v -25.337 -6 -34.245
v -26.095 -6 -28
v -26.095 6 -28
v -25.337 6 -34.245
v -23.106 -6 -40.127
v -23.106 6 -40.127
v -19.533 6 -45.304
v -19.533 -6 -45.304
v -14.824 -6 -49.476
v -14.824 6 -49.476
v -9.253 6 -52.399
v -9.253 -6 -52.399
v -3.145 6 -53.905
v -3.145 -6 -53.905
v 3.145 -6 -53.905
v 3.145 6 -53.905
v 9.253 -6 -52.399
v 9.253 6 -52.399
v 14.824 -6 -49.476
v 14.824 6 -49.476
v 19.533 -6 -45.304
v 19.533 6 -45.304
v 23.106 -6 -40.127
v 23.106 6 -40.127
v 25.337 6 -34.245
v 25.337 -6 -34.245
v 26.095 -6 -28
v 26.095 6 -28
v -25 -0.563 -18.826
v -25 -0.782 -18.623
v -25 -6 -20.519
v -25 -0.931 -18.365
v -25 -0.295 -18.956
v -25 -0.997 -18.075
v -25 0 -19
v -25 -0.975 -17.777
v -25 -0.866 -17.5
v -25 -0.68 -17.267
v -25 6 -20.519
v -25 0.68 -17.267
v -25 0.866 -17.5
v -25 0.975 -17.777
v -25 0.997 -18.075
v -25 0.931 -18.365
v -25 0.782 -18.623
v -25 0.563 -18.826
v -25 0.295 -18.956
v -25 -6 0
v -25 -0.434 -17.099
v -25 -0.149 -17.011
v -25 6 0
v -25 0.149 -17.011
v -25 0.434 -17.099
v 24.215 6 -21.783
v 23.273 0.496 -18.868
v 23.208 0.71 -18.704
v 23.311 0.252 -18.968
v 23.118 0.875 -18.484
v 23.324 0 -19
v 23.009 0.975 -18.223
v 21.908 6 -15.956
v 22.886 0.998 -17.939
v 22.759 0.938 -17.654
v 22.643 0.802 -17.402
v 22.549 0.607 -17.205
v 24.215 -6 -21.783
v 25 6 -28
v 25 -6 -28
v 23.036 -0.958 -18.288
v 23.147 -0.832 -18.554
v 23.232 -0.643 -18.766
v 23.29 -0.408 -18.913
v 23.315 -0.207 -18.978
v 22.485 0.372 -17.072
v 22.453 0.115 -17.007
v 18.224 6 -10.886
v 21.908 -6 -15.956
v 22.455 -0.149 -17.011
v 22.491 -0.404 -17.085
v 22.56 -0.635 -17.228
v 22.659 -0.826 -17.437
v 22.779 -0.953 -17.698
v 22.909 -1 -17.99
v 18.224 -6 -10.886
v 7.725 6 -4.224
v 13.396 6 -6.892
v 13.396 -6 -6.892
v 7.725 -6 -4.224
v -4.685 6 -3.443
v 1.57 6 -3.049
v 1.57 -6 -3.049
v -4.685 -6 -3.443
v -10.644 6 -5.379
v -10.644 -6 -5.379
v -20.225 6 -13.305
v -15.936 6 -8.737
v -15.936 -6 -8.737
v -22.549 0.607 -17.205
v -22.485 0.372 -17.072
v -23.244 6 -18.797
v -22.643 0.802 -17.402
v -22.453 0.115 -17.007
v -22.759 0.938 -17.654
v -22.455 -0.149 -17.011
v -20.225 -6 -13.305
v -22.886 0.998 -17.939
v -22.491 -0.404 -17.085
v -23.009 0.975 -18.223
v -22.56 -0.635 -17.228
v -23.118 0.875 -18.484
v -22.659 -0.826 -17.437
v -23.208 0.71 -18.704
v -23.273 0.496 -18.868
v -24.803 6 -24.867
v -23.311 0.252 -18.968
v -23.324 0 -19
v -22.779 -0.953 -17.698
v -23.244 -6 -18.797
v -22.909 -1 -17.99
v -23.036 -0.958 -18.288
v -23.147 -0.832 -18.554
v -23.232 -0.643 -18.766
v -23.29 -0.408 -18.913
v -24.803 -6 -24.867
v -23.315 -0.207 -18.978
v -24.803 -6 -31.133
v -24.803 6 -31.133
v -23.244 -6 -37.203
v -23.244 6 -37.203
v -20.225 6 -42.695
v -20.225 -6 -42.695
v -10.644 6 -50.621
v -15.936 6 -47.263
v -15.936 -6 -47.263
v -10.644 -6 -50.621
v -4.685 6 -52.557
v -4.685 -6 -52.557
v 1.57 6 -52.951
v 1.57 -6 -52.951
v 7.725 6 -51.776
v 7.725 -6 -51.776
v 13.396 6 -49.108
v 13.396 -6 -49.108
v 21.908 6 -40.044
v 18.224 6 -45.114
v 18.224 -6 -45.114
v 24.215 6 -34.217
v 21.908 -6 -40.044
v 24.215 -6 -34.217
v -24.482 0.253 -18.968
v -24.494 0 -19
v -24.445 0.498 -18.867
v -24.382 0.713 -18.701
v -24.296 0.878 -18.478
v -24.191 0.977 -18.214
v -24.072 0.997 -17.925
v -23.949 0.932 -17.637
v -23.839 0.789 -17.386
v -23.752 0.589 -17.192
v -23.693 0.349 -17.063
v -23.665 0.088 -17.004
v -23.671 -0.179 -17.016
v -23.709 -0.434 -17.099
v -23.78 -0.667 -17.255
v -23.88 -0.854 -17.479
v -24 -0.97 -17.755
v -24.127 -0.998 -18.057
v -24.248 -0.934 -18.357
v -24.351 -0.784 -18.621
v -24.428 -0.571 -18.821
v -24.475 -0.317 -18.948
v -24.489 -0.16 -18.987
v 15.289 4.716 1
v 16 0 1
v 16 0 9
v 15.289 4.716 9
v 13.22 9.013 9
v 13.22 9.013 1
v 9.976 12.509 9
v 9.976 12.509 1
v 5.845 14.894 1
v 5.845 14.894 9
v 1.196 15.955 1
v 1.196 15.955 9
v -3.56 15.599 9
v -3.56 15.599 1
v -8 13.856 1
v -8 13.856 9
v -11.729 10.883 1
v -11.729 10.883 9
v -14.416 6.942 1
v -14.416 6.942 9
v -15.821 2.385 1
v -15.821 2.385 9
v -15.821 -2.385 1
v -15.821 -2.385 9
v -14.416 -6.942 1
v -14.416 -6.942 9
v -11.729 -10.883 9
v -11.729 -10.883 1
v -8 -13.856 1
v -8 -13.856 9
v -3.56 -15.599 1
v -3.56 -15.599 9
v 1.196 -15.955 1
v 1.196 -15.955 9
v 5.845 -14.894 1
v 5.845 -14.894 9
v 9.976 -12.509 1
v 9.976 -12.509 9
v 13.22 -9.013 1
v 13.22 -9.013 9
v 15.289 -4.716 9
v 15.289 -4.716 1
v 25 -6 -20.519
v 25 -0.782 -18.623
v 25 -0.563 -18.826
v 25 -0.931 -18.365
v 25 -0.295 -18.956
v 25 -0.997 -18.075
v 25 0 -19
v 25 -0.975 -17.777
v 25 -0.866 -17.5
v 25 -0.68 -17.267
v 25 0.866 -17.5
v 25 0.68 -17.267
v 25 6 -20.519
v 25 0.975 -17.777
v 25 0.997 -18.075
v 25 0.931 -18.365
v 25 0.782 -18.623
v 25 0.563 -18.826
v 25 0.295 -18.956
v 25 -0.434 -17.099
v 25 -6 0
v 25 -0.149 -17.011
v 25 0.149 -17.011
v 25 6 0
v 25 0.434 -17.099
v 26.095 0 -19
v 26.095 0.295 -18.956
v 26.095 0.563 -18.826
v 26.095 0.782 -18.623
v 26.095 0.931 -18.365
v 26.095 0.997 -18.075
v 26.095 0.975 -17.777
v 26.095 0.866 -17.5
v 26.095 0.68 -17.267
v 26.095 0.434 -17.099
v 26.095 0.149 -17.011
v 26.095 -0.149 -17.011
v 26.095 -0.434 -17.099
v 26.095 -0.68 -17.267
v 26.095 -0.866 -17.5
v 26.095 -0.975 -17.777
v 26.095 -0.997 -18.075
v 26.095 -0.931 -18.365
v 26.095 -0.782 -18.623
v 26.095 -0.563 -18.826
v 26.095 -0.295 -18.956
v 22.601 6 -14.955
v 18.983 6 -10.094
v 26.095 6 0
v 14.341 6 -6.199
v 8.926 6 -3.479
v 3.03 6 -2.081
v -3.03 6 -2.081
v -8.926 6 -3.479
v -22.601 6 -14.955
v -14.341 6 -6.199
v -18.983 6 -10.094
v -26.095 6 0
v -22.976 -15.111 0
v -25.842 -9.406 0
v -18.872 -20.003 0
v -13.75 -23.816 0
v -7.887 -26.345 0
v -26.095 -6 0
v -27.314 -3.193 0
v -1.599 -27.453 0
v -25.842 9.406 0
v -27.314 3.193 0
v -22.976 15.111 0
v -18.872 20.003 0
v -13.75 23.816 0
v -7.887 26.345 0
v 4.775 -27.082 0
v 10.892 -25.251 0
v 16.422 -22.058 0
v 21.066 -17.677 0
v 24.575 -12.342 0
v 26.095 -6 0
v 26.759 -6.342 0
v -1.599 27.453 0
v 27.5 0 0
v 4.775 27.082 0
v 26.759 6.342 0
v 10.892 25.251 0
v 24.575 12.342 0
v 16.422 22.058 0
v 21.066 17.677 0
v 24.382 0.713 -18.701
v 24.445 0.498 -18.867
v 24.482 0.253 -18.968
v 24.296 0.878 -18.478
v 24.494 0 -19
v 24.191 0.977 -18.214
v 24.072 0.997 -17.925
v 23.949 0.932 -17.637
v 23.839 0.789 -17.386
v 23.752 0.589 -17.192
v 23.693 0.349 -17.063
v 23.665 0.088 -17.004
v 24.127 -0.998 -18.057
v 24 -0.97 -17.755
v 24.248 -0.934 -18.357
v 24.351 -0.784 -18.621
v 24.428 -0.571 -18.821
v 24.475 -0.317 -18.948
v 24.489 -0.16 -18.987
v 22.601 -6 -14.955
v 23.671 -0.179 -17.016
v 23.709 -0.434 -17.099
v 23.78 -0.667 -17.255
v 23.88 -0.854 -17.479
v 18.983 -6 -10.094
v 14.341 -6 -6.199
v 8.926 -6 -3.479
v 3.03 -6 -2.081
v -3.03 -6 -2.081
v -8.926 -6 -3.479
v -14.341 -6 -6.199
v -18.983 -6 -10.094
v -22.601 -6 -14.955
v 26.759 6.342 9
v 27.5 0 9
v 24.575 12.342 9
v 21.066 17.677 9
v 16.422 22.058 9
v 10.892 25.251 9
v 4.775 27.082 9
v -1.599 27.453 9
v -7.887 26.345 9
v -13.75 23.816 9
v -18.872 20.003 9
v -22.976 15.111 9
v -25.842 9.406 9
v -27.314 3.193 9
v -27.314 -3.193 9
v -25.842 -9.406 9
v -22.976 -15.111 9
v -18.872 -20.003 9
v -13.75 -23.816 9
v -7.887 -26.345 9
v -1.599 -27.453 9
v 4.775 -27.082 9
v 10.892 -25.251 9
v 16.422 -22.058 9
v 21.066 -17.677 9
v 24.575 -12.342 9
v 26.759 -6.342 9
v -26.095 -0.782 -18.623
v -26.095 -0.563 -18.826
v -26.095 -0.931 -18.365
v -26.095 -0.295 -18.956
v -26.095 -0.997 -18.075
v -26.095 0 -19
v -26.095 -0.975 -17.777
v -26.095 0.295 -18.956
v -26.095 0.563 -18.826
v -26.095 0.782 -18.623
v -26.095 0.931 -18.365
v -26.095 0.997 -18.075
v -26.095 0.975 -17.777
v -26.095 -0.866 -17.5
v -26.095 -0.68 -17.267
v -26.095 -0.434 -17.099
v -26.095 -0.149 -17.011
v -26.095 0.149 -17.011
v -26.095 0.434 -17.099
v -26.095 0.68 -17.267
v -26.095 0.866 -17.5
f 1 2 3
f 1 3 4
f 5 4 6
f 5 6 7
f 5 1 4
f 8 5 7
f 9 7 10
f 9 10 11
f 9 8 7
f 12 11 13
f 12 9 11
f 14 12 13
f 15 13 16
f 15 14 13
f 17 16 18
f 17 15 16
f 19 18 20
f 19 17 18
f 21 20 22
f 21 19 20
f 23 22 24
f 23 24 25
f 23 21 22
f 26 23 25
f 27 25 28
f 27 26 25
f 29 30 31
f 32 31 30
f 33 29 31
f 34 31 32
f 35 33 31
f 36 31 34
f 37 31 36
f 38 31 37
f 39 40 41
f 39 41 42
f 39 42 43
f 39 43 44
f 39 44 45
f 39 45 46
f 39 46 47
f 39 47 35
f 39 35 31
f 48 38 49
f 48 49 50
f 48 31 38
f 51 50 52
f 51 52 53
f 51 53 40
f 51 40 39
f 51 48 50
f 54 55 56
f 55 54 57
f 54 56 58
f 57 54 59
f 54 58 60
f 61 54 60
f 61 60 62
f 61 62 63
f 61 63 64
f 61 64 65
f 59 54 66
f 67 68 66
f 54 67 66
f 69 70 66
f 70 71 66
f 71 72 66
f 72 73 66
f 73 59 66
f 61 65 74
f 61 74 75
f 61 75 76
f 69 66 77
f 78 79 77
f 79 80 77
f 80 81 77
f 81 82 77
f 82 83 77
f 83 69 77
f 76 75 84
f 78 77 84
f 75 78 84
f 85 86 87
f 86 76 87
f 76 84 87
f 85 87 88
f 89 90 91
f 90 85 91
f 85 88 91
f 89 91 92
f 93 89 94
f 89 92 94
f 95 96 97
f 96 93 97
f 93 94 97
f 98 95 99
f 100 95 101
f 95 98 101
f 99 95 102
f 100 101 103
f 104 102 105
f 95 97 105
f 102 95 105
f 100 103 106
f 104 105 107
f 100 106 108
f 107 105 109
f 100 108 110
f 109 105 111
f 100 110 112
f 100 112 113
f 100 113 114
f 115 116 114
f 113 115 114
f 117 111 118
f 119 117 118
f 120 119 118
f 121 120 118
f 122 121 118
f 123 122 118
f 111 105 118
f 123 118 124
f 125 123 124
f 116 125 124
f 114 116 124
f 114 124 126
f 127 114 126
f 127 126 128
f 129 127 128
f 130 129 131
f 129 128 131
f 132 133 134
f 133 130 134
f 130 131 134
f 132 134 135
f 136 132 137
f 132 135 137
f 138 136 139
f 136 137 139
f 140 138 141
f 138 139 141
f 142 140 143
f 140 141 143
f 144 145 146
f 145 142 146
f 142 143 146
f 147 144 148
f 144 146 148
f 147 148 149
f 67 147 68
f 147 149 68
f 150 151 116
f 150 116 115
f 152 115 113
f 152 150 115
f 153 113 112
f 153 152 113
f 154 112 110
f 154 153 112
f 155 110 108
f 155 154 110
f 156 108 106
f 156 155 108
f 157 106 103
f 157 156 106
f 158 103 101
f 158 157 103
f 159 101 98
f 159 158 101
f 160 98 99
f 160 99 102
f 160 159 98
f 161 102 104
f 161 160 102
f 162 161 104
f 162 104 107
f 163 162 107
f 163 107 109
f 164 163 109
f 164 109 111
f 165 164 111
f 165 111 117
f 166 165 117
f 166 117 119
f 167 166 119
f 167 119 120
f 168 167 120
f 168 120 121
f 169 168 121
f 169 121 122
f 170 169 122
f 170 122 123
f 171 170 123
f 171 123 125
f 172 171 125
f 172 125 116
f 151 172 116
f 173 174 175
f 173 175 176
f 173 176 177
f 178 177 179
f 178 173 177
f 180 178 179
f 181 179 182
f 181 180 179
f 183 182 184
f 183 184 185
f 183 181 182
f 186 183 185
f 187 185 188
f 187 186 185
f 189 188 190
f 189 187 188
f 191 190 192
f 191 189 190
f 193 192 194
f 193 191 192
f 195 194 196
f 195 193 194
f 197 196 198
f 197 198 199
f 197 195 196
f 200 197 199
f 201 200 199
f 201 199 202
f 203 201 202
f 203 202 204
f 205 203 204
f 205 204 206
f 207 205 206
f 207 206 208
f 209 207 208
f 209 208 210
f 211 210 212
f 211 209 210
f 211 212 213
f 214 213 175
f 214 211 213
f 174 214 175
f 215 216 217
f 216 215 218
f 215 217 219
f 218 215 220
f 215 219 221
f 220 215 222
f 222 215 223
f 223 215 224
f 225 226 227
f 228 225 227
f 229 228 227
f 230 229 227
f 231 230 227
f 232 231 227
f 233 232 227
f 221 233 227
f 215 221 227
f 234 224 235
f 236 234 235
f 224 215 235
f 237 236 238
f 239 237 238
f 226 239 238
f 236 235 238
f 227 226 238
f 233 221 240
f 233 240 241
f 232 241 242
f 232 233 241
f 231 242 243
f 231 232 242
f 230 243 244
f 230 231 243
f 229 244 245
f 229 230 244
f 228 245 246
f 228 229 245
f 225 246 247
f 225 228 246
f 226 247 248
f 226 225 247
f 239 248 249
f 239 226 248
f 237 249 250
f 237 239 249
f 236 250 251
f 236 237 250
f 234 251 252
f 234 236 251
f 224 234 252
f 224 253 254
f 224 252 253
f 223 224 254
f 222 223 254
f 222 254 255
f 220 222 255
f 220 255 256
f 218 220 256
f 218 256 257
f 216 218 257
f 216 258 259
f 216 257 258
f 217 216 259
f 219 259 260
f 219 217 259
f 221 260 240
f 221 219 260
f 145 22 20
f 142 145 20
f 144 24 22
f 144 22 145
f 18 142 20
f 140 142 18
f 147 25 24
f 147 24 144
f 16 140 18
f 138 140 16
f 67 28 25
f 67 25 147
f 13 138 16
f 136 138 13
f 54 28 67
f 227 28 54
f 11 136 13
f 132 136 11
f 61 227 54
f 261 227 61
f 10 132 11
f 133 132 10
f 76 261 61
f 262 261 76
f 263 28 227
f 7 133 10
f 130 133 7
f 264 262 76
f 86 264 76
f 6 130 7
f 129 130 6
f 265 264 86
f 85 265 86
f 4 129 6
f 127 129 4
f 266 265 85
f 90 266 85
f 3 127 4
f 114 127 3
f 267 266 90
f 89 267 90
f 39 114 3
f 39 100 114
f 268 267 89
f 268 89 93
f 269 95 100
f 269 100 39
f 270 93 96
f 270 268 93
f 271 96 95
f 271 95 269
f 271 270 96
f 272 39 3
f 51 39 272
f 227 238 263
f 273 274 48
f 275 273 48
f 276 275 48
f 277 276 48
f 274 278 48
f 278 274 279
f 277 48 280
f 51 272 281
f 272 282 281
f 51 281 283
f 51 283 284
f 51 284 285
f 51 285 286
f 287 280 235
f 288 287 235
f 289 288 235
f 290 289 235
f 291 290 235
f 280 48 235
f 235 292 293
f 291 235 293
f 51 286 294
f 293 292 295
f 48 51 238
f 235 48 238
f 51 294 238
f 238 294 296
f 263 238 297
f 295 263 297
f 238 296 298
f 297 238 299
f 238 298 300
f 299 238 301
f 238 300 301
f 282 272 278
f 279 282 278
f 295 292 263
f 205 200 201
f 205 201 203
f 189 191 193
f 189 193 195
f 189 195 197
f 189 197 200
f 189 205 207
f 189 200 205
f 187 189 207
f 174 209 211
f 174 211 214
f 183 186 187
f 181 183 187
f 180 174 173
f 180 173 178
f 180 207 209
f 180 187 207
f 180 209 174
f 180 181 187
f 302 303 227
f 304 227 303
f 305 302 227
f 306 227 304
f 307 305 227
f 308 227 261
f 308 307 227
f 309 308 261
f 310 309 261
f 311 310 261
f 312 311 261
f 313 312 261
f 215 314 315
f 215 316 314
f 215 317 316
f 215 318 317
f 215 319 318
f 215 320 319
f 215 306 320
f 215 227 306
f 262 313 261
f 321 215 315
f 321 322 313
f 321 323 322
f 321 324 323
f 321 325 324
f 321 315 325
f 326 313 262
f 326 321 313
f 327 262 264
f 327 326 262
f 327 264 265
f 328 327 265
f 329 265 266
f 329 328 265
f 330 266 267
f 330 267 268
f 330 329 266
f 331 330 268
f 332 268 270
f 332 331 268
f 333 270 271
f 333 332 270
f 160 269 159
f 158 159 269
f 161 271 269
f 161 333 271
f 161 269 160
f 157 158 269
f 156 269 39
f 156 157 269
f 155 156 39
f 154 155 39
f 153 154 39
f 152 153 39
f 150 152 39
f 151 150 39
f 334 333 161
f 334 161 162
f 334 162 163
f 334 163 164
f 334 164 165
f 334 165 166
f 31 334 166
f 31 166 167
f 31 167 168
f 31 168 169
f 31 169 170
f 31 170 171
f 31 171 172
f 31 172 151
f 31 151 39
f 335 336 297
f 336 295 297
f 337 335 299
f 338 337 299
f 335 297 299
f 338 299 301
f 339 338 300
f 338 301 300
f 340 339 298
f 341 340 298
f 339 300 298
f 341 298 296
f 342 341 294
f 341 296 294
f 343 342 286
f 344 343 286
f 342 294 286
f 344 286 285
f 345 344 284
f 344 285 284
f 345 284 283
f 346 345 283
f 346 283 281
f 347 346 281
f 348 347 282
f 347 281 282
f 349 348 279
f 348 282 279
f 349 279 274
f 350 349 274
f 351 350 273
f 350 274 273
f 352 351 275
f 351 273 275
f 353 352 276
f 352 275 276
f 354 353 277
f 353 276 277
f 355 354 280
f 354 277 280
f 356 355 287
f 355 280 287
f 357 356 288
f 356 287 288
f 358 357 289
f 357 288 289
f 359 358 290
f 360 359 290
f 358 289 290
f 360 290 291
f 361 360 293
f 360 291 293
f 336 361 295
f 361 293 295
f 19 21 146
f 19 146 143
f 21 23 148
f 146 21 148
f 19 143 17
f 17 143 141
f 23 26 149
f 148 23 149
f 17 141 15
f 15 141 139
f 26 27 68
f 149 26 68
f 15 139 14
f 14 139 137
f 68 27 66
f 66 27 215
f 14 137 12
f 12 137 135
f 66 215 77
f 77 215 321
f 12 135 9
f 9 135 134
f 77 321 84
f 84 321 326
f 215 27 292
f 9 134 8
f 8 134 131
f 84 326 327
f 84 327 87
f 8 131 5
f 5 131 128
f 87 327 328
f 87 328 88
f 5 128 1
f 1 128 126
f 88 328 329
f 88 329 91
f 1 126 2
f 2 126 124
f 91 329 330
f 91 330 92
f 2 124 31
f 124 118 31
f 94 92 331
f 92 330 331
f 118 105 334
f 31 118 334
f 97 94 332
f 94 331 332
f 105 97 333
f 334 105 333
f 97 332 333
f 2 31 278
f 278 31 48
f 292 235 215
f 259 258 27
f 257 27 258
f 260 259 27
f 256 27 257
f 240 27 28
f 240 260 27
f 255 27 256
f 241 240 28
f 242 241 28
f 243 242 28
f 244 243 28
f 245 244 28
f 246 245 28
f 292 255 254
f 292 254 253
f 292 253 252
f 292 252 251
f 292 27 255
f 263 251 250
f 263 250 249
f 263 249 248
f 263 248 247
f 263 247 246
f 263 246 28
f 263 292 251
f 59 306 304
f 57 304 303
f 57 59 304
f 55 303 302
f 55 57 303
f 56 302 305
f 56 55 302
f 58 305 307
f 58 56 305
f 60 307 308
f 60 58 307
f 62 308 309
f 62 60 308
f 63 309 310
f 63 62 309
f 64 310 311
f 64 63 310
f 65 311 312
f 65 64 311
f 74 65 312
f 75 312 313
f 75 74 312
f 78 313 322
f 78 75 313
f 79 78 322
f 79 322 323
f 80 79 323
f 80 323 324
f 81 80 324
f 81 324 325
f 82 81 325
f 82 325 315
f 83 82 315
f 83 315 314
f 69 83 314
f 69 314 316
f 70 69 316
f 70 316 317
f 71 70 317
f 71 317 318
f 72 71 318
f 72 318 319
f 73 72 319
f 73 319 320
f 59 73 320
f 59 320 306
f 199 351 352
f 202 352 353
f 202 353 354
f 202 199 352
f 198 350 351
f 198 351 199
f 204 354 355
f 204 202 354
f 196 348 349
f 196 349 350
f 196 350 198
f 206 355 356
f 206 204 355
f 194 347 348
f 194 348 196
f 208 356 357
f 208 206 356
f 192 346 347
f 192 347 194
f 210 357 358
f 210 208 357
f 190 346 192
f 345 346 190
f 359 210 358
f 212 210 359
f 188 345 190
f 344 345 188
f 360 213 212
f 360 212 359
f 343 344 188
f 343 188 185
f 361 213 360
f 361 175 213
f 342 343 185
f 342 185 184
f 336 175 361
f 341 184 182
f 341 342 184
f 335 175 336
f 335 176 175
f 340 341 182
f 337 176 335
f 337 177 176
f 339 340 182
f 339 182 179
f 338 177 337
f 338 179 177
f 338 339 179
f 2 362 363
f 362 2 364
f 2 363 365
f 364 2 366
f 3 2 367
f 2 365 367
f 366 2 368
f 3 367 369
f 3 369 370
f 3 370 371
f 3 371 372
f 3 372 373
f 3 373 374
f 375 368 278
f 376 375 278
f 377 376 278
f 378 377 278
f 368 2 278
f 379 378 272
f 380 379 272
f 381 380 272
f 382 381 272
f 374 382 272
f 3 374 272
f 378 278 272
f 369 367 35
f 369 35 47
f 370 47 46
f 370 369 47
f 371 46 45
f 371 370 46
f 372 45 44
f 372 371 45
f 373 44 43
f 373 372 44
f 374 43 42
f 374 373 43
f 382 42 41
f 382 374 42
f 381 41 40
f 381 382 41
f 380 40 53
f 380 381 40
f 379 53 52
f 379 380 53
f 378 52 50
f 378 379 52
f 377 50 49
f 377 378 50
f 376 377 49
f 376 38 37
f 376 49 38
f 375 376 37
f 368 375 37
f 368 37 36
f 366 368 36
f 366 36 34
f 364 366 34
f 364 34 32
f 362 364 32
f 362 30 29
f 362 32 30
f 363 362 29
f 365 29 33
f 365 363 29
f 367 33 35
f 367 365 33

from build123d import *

# Parameters (mm, degrees)
SKETCH1_R                = 27.5
BOSS_EXTRUDE1_DEPTH      = 1
SKETCH2_R                = 27.5
SKETCH2_R_2              = 16
BOSS_EXTRUDE2_DEPTH      = 8
SKETCH3_W                = 1.095229805
SKETCH3_H                = 12
BOSS_EXTRUDE3_DEPTH      = 28
BOSS_EXTRUDE4_DEPTH      = 6
BOSS_EXTRUDE4_DEPTH_BACK = 6
CUT_EXTRUDE1_DEPTH       = 67.624274012
CUT_EXTRUDE1_DEPTH_BACK  = 67.624274012
SKETCH4_R                = 1


with BuildPart() as part:
    # Sketch1 → Boss-Extrude1 (new body)
    with BuildSketch(Plane.XY):
        Circle(SKETCH1_R)
    extrude(amount=BOSS_EXTRUDE1_DEPTH)

    # Sketch2 → Boss-Extrude2 (add)
    with BuildSketch(Plane.XY.offset(1)):
        Circle(SKETCH2_R)
        Circle(SKETCH2_R_2, mode=Mode.SUBTRACT)
    extrude(amount=BOSS_EXTRUDE2_DEPTH)

    # Sketch3 → Boss-Extrude3 (add)
    with BuildSketch(Plane(origin=(0, 0, 0), x_dir=(-1, 0, 0), z_dir=(0, 0, -1))):
        with Locations((-25.547614903, 0)):
            Rectangle(SKETCH3_W, SKETCH3_H)
        with Locations((25.547614903, 0)):
            Rectangle(SKETCH3_W, SKETCH3_H)
    extrude(amount=BOSS_EXTRUDE3_DEPTH)

    # Sketch6 → Boss-Extrude4 (add, two sides: drawn at the far end of the back side and taken through both)
    with BuildSketch(Plane(origin=(0, 0, 0), x_dir=(1, 0, 0), z_dir=(0, 1, 0)).offset(-BOSS_EXTRUDE4_DEPTH_BACK)):
        with BuildLine():
            ThreePointArc((-26.095229805, 28), (0, 54.095229805), (26.095229805, 28))
            ThreePointArc((26.095229805, 28), (0, 1.904770195), (-26.095229805, 28))
        make_face()
        with BuildLine():
            ThreePointArc((-25, 28), (0, 53), (25, 28))
            ThreePointArc((25, 28), (0, 3), (-25, 28))
        make_face(mode=Mode.SUBTRACT)
    extrude(amount=BOSS_EXTRUDE4_DEPTH + BOSS_EXTRUDE4_DEPTH_BACK)

    # Sketch4 → Cut-Extrude1 (cut, two sides: drawn at the far end of the back side and taken through both)
    with BuildSketch(Plane(origin=(0, 0, 0), x_dir=(0, 0, -1), z_dir=(1, 0, 0)).offset(-CUT_EXTRUDE1_DEPTH_BACK)):
        with Locations((18, 0)):
            Circle(SKETCH4_R)
    extrude(amount=CUT_EXTRUDE1_DEPTH + CUT_EXTRUDE1_DEPTH_BACK, mode=Mode.SUBTRACT)


solid = part.part
